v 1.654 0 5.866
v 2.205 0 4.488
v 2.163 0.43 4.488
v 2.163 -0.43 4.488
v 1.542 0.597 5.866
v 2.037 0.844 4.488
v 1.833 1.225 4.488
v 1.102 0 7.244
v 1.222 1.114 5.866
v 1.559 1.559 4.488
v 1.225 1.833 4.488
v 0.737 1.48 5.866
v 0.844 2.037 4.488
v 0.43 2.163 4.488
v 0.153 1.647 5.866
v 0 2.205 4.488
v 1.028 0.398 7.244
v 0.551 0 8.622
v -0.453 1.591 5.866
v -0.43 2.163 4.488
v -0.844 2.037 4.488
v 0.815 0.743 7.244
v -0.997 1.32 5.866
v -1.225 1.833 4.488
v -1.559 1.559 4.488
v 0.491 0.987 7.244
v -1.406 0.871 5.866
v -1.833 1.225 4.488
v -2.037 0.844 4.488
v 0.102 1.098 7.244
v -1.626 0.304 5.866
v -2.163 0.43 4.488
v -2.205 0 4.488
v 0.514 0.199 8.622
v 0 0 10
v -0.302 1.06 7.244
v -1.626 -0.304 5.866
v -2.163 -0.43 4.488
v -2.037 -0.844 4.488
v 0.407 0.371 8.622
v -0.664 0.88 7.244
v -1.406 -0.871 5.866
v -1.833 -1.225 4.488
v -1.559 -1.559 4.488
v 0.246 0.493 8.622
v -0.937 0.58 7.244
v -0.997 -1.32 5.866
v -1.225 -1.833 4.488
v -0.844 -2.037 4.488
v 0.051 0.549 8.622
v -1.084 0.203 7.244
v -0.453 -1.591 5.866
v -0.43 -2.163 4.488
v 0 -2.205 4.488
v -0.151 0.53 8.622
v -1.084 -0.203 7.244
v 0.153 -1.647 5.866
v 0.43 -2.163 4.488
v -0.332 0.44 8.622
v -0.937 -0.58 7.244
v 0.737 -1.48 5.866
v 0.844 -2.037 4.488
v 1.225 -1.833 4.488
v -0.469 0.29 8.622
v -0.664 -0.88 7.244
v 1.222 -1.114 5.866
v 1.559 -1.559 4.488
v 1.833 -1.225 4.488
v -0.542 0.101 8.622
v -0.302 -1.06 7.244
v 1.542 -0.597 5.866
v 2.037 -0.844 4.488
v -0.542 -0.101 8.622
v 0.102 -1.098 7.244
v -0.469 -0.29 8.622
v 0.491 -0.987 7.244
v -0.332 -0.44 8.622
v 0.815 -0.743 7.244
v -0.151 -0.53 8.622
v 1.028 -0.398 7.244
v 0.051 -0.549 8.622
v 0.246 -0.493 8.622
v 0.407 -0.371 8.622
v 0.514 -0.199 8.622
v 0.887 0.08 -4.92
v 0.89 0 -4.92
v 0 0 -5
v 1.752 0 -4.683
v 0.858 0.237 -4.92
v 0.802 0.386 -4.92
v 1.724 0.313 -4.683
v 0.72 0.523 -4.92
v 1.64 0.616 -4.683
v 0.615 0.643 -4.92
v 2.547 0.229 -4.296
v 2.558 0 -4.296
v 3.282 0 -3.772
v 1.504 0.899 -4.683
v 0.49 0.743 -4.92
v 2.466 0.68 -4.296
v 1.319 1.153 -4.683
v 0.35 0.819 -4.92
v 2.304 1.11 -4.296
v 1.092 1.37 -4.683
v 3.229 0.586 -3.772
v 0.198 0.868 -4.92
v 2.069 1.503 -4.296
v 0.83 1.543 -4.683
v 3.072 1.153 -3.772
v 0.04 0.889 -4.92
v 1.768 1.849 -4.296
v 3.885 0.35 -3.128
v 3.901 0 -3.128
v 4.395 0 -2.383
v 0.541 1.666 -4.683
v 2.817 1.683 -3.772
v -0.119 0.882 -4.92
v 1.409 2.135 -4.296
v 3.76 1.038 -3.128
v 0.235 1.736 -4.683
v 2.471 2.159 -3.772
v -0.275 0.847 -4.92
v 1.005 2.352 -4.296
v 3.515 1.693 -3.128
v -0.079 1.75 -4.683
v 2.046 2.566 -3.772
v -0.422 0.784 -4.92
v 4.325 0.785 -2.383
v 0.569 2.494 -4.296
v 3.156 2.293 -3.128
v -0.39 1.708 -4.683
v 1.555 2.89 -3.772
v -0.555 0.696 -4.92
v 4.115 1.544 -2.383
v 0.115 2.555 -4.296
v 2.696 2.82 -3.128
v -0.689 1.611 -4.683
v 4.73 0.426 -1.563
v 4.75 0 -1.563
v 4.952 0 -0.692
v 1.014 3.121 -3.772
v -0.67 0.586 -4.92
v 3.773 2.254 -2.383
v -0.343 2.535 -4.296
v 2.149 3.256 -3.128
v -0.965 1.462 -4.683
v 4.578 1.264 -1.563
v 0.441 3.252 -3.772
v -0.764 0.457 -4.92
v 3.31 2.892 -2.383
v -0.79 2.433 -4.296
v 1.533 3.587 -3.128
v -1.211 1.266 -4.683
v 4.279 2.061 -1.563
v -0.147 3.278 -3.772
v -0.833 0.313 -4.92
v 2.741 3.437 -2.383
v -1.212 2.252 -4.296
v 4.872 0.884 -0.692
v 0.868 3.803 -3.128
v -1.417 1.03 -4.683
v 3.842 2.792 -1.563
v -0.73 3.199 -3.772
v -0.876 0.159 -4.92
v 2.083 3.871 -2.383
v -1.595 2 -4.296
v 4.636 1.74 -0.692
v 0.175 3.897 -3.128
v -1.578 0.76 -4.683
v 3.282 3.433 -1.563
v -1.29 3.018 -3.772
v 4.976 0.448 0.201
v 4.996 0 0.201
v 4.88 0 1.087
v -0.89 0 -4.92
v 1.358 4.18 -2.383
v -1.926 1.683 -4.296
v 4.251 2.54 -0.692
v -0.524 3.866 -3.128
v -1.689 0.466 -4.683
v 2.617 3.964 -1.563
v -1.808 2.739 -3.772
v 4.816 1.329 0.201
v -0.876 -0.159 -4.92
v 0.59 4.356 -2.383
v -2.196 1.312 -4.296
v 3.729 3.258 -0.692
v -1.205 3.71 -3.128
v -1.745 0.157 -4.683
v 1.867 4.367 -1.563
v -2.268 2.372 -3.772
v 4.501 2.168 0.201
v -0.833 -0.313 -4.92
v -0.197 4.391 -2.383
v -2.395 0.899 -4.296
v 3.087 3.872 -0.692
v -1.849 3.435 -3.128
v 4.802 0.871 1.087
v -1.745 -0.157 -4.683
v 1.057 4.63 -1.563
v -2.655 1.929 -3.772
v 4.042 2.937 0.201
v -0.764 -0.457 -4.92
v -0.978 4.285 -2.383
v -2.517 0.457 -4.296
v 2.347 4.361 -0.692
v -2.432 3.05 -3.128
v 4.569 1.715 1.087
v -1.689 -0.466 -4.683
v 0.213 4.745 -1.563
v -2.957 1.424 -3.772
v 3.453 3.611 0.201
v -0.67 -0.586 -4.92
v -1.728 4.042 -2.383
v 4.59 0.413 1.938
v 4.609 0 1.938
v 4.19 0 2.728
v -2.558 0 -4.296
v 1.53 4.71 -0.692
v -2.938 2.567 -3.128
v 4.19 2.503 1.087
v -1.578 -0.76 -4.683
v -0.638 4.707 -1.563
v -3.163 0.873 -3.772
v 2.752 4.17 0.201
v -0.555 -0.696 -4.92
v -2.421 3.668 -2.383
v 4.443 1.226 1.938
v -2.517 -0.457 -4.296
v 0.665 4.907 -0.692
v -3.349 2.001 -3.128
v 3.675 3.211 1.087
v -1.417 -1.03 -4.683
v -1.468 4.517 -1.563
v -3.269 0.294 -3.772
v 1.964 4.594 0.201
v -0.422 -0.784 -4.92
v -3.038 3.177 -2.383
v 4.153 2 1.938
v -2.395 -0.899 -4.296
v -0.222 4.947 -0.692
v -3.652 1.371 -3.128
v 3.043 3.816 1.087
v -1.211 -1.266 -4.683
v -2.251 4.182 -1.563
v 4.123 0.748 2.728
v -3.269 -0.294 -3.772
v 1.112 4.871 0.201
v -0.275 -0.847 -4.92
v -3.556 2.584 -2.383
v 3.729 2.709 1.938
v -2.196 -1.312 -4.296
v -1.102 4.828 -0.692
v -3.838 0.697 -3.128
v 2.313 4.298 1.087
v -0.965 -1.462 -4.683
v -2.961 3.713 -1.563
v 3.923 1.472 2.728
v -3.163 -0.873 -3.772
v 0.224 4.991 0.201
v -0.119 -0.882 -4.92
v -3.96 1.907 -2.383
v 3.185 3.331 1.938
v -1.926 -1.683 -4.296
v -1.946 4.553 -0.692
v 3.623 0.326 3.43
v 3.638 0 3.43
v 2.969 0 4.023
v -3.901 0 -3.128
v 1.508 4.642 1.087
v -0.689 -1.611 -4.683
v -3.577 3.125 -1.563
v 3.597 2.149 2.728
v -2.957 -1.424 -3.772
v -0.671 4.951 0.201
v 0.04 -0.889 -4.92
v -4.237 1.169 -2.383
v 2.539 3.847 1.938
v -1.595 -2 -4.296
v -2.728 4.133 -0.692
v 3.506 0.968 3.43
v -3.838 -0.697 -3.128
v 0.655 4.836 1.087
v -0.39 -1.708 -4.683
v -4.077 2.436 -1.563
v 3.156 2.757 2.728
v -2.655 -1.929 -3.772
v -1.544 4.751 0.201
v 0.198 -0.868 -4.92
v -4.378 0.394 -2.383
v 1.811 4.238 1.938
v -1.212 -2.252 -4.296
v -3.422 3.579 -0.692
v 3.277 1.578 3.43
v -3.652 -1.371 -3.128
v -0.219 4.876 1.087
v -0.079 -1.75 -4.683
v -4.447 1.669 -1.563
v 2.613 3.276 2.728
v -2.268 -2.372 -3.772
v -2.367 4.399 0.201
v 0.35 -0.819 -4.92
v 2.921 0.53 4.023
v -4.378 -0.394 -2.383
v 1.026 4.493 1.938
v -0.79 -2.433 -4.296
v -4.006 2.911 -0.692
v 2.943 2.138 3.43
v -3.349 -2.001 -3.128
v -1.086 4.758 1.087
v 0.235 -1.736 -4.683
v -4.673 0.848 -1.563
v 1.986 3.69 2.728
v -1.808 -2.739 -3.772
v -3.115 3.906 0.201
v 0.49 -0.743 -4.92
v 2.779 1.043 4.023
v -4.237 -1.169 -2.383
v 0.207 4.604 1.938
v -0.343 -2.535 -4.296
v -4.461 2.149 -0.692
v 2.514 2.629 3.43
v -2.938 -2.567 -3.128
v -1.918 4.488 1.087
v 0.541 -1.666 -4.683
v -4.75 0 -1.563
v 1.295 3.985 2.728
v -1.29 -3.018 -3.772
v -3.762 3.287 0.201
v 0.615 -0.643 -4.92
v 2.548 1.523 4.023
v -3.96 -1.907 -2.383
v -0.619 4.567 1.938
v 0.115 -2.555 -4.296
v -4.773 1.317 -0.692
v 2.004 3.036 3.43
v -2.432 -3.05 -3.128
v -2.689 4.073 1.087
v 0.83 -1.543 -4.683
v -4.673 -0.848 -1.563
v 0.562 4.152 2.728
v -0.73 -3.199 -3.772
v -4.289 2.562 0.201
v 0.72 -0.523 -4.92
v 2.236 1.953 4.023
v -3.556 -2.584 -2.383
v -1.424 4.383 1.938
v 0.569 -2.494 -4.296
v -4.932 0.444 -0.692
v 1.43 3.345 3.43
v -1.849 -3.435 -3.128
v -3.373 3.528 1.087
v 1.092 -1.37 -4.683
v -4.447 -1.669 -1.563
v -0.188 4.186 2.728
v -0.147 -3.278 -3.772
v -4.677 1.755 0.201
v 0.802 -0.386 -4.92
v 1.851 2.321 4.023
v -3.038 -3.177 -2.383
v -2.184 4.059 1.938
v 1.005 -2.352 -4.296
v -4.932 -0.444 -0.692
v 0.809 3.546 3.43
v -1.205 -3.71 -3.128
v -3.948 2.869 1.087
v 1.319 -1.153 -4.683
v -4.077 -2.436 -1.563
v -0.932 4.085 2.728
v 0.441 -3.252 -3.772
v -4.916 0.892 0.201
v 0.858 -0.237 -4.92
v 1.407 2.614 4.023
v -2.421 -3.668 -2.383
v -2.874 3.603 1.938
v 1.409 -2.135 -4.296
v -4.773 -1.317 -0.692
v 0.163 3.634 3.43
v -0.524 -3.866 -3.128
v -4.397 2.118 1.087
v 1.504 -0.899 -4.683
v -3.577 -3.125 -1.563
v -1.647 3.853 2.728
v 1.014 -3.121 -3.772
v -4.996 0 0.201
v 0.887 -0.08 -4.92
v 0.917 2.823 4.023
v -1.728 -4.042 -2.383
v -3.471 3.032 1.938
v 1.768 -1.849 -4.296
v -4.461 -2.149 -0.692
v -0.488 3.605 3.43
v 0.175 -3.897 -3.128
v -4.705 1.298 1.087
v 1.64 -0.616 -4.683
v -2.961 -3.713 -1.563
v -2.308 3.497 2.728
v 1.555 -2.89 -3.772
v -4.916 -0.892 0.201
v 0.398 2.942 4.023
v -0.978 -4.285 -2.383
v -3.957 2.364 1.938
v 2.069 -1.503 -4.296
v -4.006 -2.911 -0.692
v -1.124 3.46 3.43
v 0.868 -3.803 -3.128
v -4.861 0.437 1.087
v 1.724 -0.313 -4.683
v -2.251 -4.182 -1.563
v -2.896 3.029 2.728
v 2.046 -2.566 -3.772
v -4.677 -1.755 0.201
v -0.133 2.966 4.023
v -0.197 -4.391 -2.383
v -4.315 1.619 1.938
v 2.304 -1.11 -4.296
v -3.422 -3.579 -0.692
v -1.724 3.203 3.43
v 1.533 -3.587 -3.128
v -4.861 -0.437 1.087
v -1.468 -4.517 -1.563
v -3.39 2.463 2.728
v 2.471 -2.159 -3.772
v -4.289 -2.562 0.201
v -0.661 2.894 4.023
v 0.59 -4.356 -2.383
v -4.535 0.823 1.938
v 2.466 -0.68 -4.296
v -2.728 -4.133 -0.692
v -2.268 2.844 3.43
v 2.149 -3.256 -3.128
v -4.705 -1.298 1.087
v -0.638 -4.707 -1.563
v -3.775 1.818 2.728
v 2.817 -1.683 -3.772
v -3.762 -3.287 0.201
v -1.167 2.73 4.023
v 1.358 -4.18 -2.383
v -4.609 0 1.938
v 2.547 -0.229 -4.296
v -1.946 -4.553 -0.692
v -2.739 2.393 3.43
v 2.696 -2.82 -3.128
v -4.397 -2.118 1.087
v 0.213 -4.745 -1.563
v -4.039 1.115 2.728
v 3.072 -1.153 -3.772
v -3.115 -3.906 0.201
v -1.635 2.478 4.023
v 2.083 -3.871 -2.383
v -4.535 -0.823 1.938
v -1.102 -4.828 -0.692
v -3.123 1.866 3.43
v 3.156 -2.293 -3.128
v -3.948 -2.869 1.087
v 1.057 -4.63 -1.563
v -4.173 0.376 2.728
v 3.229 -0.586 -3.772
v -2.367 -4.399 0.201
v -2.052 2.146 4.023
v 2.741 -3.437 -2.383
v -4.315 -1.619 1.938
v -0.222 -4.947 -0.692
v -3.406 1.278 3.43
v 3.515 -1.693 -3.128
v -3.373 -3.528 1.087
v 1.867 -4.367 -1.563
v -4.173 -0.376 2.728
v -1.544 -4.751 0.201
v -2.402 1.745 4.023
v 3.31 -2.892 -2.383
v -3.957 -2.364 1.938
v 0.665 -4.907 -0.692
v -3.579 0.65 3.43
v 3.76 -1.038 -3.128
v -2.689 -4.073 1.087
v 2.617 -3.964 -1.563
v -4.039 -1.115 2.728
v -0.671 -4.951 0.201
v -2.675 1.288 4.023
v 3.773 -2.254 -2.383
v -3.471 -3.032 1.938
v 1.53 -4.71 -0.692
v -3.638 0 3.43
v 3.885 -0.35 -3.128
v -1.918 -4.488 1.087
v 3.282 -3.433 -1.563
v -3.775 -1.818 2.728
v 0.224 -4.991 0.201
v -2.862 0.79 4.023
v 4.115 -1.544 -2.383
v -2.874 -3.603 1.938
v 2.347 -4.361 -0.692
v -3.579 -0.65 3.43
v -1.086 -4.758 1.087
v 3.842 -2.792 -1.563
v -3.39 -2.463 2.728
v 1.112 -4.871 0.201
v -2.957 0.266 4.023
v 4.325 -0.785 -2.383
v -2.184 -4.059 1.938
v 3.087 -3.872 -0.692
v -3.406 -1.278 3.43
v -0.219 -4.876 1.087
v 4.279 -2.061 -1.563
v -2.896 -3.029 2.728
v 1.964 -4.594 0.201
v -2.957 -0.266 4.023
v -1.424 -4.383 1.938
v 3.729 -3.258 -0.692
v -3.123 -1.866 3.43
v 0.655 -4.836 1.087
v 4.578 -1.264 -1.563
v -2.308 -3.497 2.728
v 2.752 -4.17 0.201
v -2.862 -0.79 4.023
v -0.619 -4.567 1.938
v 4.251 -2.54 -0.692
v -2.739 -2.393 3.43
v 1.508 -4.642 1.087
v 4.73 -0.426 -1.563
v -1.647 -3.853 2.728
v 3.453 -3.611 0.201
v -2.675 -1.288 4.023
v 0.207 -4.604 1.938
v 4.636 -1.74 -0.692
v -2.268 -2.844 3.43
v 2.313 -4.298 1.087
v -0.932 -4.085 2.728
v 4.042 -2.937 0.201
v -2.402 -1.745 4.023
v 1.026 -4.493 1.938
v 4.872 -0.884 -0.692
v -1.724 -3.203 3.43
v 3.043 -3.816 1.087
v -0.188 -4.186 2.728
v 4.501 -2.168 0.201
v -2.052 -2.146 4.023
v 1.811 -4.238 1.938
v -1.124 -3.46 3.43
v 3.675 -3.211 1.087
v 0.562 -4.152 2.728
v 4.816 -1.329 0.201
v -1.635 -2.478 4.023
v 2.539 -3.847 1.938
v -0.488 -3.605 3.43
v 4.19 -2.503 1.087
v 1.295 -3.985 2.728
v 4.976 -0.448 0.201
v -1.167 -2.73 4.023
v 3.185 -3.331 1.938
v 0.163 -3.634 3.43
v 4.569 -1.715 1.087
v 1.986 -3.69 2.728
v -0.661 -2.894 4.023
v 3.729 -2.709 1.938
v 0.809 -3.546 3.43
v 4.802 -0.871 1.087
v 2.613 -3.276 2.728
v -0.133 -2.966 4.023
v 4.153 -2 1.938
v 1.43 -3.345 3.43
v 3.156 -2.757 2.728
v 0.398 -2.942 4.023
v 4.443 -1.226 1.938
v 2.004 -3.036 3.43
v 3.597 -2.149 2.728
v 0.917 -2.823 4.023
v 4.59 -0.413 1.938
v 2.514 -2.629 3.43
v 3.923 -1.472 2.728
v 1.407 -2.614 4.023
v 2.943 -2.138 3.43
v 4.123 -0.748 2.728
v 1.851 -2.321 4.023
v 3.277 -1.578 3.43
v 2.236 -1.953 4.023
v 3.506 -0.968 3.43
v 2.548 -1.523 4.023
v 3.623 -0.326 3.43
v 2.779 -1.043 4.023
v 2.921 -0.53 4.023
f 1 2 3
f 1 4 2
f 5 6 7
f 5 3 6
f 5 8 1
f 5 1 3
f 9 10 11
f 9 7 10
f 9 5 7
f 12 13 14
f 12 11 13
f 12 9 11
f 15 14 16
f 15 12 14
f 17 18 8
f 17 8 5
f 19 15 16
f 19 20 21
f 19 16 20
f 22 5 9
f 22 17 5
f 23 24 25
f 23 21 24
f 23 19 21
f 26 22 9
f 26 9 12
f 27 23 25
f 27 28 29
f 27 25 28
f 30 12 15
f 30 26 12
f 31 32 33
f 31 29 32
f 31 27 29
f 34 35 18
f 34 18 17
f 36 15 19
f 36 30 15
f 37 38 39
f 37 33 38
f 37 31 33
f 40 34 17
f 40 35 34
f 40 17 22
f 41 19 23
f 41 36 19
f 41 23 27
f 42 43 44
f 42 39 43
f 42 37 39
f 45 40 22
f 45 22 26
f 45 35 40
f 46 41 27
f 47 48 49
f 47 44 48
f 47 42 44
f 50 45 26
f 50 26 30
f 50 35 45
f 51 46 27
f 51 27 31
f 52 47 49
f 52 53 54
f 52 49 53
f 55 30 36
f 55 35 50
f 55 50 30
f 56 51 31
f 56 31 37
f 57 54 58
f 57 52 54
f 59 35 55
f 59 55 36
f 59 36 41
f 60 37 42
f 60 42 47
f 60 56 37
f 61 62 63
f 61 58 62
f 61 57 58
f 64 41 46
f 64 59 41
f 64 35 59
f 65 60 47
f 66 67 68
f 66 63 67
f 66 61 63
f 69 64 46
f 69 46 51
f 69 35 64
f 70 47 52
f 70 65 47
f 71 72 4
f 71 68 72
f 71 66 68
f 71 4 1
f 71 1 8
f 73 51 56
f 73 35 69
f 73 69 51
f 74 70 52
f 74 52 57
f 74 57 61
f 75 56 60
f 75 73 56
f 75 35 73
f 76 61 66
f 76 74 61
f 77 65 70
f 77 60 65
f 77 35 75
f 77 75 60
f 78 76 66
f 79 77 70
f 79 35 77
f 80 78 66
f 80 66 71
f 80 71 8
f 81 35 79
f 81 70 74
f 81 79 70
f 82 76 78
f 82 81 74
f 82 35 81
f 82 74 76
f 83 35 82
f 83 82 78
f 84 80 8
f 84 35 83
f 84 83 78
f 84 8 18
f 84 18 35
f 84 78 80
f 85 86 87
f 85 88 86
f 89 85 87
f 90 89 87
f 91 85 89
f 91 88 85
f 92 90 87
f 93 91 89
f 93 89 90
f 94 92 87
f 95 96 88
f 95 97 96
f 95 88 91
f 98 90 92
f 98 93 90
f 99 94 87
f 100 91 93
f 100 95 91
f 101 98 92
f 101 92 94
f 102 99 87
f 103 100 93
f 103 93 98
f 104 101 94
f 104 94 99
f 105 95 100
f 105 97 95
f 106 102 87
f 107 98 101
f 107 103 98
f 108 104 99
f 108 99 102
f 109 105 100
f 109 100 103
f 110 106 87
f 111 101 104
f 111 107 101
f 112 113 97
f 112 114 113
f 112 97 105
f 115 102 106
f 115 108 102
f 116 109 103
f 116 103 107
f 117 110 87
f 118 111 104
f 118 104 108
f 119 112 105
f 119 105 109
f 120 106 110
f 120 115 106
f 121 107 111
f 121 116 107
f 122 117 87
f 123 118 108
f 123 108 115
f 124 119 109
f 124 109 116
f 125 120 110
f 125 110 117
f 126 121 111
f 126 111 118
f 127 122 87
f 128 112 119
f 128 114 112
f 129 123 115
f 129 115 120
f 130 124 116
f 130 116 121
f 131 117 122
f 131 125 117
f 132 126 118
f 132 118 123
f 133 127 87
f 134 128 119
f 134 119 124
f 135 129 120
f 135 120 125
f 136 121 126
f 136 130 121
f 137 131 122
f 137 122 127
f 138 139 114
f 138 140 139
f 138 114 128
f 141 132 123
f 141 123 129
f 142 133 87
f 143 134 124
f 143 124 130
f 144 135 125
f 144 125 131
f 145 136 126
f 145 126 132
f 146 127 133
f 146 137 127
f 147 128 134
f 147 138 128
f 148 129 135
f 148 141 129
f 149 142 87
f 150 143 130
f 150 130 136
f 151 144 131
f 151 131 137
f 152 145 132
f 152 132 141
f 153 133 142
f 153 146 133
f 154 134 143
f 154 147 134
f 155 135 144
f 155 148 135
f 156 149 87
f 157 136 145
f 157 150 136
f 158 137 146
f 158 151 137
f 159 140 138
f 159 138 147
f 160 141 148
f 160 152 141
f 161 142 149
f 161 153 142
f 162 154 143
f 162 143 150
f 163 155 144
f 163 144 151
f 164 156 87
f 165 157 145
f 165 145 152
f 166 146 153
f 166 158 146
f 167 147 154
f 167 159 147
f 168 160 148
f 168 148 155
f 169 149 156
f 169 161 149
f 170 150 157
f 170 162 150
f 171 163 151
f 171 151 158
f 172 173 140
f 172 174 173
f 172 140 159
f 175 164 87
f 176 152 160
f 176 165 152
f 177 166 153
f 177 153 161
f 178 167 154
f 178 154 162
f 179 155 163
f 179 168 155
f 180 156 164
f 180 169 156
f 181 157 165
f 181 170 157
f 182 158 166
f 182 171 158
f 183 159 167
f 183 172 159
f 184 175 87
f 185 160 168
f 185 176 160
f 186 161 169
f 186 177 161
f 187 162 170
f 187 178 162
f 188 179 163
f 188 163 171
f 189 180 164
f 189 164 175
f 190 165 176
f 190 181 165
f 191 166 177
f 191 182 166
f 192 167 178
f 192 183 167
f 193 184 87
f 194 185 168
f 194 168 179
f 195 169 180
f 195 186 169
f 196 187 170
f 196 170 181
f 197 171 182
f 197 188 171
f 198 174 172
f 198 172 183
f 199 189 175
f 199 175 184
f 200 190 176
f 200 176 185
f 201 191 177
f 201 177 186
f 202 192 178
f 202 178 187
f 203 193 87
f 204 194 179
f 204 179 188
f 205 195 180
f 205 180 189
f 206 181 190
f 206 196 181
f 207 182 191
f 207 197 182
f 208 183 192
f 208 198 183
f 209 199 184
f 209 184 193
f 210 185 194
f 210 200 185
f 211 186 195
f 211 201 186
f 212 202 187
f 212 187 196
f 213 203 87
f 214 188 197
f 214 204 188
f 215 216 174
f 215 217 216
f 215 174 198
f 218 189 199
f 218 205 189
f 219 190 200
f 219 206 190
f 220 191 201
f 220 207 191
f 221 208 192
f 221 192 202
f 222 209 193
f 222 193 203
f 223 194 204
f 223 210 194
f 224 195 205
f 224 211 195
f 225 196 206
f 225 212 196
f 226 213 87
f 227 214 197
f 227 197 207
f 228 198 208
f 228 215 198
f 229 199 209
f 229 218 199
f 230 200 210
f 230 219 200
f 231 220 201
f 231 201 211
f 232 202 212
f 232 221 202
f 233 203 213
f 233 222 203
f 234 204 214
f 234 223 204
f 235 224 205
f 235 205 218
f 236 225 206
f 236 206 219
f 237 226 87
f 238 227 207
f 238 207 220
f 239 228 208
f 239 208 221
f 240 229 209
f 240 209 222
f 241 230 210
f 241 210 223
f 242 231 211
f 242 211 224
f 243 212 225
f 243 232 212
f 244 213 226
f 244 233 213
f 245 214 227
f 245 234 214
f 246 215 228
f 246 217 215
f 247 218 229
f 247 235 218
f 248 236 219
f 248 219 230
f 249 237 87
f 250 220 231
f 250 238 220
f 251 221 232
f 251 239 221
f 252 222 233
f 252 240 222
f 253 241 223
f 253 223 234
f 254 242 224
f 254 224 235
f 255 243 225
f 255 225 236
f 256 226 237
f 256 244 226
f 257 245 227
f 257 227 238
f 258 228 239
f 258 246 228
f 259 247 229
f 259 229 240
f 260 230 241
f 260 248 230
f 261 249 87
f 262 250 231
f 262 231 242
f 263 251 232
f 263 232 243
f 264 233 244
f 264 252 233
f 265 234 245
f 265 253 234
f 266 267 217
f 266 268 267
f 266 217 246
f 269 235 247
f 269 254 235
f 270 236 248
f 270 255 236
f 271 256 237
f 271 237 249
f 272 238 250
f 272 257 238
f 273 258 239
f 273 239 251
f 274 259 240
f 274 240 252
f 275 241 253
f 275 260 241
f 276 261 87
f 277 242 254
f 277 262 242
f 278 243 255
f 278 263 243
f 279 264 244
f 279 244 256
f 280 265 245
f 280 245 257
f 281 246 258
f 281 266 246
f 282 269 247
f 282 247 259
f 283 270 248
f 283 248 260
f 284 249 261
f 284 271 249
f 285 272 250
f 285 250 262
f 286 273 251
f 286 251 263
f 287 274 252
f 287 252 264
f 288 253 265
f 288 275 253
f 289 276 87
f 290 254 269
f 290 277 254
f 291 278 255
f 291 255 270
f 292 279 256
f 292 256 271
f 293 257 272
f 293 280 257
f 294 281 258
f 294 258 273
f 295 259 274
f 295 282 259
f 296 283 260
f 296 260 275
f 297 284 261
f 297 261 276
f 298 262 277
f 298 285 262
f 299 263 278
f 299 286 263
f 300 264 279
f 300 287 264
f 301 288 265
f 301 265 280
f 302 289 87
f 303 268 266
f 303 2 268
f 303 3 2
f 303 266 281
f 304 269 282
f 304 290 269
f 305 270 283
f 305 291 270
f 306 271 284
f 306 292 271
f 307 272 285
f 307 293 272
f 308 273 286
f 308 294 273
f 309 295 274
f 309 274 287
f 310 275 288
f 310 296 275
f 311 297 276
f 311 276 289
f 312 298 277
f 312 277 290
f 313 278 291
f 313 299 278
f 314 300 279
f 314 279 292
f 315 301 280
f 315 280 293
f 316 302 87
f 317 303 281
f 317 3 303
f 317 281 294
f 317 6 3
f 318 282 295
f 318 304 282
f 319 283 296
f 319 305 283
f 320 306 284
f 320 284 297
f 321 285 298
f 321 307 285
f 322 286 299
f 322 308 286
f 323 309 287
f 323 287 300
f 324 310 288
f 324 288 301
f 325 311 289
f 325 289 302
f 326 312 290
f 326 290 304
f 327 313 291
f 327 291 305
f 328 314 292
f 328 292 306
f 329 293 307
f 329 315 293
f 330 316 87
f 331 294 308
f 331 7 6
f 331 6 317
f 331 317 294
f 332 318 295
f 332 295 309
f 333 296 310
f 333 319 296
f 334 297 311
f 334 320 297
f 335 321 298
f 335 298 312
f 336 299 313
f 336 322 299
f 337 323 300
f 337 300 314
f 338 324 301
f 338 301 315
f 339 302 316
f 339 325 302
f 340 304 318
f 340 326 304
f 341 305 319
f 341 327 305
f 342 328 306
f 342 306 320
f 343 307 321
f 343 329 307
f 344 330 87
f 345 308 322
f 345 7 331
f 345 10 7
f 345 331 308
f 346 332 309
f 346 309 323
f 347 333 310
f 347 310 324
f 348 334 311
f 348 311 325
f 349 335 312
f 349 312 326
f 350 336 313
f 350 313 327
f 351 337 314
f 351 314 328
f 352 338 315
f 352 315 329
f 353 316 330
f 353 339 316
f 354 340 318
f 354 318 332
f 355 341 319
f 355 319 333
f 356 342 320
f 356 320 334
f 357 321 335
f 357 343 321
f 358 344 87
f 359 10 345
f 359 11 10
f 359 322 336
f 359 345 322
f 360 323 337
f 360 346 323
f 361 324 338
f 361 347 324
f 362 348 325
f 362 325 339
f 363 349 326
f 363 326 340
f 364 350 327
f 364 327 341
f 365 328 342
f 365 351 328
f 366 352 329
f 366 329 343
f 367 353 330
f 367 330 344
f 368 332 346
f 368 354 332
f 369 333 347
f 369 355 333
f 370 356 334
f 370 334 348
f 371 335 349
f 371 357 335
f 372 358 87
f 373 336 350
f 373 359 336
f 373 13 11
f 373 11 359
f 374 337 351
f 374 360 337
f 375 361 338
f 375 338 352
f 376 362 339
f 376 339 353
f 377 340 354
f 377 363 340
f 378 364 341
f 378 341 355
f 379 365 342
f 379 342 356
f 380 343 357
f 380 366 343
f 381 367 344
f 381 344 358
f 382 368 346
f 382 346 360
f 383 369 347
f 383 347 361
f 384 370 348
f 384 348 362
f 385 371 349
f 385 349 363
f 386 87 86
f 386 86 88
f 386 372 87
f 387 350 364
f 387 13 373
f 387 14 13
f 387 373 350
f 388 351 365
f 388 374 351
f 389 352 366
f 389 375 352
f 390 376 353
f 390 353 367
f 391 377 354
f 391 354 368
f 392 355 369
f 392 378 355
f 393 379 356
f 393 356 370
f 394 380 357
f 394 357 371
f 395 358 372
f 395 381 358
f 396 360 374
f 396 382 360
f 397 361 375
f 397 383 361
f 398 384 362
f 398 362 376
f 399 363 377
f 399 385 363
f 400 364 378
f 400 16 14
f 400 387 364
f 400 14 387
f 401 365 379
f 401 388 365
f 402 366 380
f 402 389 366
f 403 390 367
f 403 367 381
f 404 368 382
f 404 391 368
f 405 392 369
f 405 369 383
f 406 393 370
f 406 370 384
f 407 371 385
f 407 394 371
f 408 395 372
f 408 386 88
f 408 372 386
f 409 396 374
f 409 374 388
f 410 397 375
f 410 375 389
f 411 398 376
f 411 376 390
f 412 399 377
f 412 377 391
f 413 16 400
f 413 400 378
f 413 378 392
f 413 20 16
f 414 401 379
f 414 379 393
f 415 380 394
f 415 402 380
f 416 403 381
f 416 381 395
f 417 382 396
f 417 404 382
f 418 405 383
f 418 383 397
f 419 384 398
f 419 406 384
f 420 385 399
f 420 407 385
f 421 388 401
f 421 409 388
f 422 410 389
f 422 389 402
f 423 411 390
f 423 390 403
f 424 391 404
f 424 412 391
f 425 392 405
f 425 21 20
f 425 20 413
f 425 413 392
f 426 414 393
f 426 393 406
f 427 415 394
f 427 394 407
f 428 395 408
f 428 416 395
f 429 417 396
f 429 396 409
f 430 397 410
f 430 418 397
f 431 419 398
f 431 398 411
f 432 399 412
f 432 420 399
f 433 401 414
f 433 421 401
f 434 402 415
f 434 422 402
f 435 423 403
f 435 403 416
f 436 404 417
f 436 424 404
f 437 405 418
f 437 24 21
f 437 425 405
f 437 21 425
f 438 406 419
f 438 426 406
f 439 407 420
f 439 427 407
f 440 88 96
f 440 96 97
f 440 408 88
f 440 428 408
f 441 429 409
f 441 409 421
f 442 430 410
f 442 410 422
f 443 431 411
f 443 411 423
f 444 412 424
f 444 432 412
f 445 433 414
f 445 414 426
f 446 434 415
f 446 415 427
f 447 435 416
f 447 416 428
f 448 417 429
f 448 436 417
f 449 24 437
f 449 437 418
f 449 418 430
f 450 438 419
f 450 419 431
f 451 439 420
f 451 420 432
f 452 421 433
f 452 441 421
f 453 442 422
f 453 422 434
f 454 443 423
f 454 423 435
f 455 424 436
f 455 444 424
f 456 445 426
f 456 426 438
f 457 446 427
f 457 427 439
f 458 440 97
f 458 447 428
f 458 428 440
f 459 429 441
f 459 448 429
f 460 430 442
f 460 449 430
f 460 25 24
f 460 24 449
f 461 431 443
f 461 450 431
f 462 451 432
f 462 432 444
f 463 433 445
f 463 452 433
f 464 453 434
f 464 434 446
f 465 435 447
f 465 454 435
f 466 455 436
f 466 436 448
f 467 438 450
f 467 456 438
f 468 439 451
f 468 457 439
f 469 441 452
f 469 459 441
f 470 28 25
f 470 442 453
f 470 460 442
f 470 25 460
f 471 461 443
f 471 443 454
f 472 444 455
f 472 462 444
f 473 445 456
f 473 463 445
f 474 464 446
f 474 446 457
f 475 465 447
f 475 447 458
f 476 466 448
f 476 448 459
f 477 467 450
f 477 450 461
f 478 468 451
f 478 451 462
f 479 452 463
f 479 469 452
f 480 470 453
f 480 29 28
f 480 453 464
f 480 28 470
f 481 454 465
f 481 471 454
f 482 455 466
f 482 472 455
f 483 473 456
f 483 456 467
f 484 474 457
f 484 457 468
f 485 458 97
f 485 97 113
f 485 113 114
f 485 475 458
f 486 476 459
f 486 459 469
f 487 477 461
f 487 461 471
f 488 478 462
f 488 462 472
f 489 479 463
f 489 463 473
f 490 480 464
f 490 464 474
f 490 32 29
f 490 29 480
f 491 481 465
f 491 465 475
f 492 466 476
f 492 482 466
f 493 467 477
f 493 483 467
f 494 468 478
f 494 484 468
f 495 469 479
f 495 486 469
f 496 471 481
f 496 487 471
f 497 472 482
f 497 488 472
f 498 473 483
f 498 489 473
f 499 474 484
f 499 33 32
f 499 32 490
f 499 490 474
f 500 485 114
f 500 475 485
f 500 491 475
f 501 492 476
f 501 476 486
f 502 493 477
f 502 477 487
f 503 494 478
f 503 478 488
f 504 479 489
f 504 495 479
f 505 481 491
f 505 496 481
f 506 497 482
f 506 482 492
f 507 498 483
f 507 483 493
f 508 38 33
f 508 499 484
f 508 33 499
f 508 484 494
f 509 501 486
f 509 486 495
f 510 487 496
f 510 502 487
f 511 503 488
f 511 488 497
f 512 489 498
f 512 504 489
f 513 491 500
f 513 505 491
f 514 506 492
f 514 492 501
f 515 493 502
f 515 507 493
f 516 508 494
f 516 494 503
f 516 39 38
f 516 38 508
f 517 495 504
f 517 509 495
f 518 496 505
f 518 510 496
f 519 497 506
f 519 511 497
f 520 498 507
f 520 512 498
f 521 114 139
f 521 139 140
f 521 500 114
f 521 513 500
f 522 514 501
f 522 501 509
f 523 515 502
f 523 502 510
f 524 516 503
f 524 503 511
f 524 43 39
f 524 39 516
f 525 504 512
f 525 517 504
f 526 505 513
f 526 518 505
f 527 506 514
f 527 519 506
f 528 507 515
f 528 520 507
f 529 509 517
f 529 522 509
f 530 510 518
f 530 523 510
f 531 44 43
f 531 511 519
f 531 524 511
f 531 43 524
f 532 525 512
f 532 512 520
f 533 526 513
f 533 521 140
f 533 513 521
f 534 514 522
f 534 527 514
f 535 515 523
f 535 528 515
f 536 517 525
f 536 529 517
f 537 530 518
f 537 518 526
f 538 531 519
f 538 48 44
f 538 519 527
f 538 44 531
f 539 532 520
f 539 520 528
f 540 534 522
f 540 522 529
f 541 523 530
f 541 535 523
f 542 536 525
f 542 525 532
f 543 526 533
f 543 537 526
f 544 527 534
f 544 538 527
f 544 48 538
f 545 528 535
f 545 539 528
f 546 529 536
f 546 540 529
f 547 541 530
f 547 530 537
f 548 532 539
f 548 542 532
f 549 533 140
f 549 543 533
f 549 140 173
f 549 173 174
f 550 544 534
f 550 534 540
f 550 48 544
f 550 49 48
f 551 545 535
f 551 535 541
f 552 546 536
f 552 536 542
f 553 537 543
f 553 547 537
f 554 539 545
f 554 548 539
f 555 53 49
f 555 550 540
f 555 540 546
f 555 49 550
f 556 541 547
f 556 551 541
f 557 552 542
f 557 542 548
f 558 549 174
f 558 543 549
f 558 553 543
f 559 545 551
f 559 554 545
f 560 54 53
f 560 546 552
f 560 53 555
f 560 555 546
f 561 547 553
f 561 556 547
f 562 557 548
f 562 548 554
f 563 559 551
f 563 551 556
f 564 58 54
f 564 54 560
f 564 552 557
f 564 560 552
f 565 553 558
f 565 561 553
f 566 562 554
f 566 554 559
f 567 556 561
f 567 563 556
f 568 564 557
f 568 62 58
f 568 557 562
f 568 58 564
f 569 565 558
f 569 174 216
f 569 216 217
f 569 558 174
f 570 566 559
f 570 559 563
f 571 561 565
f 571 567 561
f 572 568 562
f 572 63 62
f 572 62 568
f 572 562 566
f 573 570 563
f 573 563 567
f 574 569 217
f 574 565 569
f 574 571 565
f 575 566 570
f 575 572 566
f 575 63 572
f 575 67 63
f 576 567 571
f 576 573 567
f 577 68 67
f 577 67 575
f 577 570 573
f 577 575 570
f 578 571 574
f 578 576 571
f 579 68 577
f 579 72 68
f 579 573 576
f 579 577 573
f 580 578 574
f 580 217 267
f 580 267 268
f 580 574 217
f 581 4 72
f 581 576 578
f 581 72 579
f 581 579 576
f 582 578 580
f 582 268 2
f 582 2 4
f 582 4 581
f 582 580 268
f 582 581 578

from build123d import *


with BuildPart() as cone:
    # Cone → Cone (revolve)
    with BuildSketch(Plane.XZ):
        Polygon((0, 0), (4, 0), (0, 10), align=None)
    revolve(axis=Axis((0, 0, 0), (0, 0, 1)))


with BuildPart() as fusion:
    # Sphere001 → Sphere001 (revolve)
    with BuildSketch(Plane.XZ):
        with BuildLine():
            ThreePointArc((0, -5), (5, 0), (0, 5))
            Line((0, 5), (0, -5))
        make_face()
    revolve(axis=Axis((0, 0, 0), (0, 0, 1)))

    # Fusion: union Cone
    add(cone.part)


solid = fusion.part
